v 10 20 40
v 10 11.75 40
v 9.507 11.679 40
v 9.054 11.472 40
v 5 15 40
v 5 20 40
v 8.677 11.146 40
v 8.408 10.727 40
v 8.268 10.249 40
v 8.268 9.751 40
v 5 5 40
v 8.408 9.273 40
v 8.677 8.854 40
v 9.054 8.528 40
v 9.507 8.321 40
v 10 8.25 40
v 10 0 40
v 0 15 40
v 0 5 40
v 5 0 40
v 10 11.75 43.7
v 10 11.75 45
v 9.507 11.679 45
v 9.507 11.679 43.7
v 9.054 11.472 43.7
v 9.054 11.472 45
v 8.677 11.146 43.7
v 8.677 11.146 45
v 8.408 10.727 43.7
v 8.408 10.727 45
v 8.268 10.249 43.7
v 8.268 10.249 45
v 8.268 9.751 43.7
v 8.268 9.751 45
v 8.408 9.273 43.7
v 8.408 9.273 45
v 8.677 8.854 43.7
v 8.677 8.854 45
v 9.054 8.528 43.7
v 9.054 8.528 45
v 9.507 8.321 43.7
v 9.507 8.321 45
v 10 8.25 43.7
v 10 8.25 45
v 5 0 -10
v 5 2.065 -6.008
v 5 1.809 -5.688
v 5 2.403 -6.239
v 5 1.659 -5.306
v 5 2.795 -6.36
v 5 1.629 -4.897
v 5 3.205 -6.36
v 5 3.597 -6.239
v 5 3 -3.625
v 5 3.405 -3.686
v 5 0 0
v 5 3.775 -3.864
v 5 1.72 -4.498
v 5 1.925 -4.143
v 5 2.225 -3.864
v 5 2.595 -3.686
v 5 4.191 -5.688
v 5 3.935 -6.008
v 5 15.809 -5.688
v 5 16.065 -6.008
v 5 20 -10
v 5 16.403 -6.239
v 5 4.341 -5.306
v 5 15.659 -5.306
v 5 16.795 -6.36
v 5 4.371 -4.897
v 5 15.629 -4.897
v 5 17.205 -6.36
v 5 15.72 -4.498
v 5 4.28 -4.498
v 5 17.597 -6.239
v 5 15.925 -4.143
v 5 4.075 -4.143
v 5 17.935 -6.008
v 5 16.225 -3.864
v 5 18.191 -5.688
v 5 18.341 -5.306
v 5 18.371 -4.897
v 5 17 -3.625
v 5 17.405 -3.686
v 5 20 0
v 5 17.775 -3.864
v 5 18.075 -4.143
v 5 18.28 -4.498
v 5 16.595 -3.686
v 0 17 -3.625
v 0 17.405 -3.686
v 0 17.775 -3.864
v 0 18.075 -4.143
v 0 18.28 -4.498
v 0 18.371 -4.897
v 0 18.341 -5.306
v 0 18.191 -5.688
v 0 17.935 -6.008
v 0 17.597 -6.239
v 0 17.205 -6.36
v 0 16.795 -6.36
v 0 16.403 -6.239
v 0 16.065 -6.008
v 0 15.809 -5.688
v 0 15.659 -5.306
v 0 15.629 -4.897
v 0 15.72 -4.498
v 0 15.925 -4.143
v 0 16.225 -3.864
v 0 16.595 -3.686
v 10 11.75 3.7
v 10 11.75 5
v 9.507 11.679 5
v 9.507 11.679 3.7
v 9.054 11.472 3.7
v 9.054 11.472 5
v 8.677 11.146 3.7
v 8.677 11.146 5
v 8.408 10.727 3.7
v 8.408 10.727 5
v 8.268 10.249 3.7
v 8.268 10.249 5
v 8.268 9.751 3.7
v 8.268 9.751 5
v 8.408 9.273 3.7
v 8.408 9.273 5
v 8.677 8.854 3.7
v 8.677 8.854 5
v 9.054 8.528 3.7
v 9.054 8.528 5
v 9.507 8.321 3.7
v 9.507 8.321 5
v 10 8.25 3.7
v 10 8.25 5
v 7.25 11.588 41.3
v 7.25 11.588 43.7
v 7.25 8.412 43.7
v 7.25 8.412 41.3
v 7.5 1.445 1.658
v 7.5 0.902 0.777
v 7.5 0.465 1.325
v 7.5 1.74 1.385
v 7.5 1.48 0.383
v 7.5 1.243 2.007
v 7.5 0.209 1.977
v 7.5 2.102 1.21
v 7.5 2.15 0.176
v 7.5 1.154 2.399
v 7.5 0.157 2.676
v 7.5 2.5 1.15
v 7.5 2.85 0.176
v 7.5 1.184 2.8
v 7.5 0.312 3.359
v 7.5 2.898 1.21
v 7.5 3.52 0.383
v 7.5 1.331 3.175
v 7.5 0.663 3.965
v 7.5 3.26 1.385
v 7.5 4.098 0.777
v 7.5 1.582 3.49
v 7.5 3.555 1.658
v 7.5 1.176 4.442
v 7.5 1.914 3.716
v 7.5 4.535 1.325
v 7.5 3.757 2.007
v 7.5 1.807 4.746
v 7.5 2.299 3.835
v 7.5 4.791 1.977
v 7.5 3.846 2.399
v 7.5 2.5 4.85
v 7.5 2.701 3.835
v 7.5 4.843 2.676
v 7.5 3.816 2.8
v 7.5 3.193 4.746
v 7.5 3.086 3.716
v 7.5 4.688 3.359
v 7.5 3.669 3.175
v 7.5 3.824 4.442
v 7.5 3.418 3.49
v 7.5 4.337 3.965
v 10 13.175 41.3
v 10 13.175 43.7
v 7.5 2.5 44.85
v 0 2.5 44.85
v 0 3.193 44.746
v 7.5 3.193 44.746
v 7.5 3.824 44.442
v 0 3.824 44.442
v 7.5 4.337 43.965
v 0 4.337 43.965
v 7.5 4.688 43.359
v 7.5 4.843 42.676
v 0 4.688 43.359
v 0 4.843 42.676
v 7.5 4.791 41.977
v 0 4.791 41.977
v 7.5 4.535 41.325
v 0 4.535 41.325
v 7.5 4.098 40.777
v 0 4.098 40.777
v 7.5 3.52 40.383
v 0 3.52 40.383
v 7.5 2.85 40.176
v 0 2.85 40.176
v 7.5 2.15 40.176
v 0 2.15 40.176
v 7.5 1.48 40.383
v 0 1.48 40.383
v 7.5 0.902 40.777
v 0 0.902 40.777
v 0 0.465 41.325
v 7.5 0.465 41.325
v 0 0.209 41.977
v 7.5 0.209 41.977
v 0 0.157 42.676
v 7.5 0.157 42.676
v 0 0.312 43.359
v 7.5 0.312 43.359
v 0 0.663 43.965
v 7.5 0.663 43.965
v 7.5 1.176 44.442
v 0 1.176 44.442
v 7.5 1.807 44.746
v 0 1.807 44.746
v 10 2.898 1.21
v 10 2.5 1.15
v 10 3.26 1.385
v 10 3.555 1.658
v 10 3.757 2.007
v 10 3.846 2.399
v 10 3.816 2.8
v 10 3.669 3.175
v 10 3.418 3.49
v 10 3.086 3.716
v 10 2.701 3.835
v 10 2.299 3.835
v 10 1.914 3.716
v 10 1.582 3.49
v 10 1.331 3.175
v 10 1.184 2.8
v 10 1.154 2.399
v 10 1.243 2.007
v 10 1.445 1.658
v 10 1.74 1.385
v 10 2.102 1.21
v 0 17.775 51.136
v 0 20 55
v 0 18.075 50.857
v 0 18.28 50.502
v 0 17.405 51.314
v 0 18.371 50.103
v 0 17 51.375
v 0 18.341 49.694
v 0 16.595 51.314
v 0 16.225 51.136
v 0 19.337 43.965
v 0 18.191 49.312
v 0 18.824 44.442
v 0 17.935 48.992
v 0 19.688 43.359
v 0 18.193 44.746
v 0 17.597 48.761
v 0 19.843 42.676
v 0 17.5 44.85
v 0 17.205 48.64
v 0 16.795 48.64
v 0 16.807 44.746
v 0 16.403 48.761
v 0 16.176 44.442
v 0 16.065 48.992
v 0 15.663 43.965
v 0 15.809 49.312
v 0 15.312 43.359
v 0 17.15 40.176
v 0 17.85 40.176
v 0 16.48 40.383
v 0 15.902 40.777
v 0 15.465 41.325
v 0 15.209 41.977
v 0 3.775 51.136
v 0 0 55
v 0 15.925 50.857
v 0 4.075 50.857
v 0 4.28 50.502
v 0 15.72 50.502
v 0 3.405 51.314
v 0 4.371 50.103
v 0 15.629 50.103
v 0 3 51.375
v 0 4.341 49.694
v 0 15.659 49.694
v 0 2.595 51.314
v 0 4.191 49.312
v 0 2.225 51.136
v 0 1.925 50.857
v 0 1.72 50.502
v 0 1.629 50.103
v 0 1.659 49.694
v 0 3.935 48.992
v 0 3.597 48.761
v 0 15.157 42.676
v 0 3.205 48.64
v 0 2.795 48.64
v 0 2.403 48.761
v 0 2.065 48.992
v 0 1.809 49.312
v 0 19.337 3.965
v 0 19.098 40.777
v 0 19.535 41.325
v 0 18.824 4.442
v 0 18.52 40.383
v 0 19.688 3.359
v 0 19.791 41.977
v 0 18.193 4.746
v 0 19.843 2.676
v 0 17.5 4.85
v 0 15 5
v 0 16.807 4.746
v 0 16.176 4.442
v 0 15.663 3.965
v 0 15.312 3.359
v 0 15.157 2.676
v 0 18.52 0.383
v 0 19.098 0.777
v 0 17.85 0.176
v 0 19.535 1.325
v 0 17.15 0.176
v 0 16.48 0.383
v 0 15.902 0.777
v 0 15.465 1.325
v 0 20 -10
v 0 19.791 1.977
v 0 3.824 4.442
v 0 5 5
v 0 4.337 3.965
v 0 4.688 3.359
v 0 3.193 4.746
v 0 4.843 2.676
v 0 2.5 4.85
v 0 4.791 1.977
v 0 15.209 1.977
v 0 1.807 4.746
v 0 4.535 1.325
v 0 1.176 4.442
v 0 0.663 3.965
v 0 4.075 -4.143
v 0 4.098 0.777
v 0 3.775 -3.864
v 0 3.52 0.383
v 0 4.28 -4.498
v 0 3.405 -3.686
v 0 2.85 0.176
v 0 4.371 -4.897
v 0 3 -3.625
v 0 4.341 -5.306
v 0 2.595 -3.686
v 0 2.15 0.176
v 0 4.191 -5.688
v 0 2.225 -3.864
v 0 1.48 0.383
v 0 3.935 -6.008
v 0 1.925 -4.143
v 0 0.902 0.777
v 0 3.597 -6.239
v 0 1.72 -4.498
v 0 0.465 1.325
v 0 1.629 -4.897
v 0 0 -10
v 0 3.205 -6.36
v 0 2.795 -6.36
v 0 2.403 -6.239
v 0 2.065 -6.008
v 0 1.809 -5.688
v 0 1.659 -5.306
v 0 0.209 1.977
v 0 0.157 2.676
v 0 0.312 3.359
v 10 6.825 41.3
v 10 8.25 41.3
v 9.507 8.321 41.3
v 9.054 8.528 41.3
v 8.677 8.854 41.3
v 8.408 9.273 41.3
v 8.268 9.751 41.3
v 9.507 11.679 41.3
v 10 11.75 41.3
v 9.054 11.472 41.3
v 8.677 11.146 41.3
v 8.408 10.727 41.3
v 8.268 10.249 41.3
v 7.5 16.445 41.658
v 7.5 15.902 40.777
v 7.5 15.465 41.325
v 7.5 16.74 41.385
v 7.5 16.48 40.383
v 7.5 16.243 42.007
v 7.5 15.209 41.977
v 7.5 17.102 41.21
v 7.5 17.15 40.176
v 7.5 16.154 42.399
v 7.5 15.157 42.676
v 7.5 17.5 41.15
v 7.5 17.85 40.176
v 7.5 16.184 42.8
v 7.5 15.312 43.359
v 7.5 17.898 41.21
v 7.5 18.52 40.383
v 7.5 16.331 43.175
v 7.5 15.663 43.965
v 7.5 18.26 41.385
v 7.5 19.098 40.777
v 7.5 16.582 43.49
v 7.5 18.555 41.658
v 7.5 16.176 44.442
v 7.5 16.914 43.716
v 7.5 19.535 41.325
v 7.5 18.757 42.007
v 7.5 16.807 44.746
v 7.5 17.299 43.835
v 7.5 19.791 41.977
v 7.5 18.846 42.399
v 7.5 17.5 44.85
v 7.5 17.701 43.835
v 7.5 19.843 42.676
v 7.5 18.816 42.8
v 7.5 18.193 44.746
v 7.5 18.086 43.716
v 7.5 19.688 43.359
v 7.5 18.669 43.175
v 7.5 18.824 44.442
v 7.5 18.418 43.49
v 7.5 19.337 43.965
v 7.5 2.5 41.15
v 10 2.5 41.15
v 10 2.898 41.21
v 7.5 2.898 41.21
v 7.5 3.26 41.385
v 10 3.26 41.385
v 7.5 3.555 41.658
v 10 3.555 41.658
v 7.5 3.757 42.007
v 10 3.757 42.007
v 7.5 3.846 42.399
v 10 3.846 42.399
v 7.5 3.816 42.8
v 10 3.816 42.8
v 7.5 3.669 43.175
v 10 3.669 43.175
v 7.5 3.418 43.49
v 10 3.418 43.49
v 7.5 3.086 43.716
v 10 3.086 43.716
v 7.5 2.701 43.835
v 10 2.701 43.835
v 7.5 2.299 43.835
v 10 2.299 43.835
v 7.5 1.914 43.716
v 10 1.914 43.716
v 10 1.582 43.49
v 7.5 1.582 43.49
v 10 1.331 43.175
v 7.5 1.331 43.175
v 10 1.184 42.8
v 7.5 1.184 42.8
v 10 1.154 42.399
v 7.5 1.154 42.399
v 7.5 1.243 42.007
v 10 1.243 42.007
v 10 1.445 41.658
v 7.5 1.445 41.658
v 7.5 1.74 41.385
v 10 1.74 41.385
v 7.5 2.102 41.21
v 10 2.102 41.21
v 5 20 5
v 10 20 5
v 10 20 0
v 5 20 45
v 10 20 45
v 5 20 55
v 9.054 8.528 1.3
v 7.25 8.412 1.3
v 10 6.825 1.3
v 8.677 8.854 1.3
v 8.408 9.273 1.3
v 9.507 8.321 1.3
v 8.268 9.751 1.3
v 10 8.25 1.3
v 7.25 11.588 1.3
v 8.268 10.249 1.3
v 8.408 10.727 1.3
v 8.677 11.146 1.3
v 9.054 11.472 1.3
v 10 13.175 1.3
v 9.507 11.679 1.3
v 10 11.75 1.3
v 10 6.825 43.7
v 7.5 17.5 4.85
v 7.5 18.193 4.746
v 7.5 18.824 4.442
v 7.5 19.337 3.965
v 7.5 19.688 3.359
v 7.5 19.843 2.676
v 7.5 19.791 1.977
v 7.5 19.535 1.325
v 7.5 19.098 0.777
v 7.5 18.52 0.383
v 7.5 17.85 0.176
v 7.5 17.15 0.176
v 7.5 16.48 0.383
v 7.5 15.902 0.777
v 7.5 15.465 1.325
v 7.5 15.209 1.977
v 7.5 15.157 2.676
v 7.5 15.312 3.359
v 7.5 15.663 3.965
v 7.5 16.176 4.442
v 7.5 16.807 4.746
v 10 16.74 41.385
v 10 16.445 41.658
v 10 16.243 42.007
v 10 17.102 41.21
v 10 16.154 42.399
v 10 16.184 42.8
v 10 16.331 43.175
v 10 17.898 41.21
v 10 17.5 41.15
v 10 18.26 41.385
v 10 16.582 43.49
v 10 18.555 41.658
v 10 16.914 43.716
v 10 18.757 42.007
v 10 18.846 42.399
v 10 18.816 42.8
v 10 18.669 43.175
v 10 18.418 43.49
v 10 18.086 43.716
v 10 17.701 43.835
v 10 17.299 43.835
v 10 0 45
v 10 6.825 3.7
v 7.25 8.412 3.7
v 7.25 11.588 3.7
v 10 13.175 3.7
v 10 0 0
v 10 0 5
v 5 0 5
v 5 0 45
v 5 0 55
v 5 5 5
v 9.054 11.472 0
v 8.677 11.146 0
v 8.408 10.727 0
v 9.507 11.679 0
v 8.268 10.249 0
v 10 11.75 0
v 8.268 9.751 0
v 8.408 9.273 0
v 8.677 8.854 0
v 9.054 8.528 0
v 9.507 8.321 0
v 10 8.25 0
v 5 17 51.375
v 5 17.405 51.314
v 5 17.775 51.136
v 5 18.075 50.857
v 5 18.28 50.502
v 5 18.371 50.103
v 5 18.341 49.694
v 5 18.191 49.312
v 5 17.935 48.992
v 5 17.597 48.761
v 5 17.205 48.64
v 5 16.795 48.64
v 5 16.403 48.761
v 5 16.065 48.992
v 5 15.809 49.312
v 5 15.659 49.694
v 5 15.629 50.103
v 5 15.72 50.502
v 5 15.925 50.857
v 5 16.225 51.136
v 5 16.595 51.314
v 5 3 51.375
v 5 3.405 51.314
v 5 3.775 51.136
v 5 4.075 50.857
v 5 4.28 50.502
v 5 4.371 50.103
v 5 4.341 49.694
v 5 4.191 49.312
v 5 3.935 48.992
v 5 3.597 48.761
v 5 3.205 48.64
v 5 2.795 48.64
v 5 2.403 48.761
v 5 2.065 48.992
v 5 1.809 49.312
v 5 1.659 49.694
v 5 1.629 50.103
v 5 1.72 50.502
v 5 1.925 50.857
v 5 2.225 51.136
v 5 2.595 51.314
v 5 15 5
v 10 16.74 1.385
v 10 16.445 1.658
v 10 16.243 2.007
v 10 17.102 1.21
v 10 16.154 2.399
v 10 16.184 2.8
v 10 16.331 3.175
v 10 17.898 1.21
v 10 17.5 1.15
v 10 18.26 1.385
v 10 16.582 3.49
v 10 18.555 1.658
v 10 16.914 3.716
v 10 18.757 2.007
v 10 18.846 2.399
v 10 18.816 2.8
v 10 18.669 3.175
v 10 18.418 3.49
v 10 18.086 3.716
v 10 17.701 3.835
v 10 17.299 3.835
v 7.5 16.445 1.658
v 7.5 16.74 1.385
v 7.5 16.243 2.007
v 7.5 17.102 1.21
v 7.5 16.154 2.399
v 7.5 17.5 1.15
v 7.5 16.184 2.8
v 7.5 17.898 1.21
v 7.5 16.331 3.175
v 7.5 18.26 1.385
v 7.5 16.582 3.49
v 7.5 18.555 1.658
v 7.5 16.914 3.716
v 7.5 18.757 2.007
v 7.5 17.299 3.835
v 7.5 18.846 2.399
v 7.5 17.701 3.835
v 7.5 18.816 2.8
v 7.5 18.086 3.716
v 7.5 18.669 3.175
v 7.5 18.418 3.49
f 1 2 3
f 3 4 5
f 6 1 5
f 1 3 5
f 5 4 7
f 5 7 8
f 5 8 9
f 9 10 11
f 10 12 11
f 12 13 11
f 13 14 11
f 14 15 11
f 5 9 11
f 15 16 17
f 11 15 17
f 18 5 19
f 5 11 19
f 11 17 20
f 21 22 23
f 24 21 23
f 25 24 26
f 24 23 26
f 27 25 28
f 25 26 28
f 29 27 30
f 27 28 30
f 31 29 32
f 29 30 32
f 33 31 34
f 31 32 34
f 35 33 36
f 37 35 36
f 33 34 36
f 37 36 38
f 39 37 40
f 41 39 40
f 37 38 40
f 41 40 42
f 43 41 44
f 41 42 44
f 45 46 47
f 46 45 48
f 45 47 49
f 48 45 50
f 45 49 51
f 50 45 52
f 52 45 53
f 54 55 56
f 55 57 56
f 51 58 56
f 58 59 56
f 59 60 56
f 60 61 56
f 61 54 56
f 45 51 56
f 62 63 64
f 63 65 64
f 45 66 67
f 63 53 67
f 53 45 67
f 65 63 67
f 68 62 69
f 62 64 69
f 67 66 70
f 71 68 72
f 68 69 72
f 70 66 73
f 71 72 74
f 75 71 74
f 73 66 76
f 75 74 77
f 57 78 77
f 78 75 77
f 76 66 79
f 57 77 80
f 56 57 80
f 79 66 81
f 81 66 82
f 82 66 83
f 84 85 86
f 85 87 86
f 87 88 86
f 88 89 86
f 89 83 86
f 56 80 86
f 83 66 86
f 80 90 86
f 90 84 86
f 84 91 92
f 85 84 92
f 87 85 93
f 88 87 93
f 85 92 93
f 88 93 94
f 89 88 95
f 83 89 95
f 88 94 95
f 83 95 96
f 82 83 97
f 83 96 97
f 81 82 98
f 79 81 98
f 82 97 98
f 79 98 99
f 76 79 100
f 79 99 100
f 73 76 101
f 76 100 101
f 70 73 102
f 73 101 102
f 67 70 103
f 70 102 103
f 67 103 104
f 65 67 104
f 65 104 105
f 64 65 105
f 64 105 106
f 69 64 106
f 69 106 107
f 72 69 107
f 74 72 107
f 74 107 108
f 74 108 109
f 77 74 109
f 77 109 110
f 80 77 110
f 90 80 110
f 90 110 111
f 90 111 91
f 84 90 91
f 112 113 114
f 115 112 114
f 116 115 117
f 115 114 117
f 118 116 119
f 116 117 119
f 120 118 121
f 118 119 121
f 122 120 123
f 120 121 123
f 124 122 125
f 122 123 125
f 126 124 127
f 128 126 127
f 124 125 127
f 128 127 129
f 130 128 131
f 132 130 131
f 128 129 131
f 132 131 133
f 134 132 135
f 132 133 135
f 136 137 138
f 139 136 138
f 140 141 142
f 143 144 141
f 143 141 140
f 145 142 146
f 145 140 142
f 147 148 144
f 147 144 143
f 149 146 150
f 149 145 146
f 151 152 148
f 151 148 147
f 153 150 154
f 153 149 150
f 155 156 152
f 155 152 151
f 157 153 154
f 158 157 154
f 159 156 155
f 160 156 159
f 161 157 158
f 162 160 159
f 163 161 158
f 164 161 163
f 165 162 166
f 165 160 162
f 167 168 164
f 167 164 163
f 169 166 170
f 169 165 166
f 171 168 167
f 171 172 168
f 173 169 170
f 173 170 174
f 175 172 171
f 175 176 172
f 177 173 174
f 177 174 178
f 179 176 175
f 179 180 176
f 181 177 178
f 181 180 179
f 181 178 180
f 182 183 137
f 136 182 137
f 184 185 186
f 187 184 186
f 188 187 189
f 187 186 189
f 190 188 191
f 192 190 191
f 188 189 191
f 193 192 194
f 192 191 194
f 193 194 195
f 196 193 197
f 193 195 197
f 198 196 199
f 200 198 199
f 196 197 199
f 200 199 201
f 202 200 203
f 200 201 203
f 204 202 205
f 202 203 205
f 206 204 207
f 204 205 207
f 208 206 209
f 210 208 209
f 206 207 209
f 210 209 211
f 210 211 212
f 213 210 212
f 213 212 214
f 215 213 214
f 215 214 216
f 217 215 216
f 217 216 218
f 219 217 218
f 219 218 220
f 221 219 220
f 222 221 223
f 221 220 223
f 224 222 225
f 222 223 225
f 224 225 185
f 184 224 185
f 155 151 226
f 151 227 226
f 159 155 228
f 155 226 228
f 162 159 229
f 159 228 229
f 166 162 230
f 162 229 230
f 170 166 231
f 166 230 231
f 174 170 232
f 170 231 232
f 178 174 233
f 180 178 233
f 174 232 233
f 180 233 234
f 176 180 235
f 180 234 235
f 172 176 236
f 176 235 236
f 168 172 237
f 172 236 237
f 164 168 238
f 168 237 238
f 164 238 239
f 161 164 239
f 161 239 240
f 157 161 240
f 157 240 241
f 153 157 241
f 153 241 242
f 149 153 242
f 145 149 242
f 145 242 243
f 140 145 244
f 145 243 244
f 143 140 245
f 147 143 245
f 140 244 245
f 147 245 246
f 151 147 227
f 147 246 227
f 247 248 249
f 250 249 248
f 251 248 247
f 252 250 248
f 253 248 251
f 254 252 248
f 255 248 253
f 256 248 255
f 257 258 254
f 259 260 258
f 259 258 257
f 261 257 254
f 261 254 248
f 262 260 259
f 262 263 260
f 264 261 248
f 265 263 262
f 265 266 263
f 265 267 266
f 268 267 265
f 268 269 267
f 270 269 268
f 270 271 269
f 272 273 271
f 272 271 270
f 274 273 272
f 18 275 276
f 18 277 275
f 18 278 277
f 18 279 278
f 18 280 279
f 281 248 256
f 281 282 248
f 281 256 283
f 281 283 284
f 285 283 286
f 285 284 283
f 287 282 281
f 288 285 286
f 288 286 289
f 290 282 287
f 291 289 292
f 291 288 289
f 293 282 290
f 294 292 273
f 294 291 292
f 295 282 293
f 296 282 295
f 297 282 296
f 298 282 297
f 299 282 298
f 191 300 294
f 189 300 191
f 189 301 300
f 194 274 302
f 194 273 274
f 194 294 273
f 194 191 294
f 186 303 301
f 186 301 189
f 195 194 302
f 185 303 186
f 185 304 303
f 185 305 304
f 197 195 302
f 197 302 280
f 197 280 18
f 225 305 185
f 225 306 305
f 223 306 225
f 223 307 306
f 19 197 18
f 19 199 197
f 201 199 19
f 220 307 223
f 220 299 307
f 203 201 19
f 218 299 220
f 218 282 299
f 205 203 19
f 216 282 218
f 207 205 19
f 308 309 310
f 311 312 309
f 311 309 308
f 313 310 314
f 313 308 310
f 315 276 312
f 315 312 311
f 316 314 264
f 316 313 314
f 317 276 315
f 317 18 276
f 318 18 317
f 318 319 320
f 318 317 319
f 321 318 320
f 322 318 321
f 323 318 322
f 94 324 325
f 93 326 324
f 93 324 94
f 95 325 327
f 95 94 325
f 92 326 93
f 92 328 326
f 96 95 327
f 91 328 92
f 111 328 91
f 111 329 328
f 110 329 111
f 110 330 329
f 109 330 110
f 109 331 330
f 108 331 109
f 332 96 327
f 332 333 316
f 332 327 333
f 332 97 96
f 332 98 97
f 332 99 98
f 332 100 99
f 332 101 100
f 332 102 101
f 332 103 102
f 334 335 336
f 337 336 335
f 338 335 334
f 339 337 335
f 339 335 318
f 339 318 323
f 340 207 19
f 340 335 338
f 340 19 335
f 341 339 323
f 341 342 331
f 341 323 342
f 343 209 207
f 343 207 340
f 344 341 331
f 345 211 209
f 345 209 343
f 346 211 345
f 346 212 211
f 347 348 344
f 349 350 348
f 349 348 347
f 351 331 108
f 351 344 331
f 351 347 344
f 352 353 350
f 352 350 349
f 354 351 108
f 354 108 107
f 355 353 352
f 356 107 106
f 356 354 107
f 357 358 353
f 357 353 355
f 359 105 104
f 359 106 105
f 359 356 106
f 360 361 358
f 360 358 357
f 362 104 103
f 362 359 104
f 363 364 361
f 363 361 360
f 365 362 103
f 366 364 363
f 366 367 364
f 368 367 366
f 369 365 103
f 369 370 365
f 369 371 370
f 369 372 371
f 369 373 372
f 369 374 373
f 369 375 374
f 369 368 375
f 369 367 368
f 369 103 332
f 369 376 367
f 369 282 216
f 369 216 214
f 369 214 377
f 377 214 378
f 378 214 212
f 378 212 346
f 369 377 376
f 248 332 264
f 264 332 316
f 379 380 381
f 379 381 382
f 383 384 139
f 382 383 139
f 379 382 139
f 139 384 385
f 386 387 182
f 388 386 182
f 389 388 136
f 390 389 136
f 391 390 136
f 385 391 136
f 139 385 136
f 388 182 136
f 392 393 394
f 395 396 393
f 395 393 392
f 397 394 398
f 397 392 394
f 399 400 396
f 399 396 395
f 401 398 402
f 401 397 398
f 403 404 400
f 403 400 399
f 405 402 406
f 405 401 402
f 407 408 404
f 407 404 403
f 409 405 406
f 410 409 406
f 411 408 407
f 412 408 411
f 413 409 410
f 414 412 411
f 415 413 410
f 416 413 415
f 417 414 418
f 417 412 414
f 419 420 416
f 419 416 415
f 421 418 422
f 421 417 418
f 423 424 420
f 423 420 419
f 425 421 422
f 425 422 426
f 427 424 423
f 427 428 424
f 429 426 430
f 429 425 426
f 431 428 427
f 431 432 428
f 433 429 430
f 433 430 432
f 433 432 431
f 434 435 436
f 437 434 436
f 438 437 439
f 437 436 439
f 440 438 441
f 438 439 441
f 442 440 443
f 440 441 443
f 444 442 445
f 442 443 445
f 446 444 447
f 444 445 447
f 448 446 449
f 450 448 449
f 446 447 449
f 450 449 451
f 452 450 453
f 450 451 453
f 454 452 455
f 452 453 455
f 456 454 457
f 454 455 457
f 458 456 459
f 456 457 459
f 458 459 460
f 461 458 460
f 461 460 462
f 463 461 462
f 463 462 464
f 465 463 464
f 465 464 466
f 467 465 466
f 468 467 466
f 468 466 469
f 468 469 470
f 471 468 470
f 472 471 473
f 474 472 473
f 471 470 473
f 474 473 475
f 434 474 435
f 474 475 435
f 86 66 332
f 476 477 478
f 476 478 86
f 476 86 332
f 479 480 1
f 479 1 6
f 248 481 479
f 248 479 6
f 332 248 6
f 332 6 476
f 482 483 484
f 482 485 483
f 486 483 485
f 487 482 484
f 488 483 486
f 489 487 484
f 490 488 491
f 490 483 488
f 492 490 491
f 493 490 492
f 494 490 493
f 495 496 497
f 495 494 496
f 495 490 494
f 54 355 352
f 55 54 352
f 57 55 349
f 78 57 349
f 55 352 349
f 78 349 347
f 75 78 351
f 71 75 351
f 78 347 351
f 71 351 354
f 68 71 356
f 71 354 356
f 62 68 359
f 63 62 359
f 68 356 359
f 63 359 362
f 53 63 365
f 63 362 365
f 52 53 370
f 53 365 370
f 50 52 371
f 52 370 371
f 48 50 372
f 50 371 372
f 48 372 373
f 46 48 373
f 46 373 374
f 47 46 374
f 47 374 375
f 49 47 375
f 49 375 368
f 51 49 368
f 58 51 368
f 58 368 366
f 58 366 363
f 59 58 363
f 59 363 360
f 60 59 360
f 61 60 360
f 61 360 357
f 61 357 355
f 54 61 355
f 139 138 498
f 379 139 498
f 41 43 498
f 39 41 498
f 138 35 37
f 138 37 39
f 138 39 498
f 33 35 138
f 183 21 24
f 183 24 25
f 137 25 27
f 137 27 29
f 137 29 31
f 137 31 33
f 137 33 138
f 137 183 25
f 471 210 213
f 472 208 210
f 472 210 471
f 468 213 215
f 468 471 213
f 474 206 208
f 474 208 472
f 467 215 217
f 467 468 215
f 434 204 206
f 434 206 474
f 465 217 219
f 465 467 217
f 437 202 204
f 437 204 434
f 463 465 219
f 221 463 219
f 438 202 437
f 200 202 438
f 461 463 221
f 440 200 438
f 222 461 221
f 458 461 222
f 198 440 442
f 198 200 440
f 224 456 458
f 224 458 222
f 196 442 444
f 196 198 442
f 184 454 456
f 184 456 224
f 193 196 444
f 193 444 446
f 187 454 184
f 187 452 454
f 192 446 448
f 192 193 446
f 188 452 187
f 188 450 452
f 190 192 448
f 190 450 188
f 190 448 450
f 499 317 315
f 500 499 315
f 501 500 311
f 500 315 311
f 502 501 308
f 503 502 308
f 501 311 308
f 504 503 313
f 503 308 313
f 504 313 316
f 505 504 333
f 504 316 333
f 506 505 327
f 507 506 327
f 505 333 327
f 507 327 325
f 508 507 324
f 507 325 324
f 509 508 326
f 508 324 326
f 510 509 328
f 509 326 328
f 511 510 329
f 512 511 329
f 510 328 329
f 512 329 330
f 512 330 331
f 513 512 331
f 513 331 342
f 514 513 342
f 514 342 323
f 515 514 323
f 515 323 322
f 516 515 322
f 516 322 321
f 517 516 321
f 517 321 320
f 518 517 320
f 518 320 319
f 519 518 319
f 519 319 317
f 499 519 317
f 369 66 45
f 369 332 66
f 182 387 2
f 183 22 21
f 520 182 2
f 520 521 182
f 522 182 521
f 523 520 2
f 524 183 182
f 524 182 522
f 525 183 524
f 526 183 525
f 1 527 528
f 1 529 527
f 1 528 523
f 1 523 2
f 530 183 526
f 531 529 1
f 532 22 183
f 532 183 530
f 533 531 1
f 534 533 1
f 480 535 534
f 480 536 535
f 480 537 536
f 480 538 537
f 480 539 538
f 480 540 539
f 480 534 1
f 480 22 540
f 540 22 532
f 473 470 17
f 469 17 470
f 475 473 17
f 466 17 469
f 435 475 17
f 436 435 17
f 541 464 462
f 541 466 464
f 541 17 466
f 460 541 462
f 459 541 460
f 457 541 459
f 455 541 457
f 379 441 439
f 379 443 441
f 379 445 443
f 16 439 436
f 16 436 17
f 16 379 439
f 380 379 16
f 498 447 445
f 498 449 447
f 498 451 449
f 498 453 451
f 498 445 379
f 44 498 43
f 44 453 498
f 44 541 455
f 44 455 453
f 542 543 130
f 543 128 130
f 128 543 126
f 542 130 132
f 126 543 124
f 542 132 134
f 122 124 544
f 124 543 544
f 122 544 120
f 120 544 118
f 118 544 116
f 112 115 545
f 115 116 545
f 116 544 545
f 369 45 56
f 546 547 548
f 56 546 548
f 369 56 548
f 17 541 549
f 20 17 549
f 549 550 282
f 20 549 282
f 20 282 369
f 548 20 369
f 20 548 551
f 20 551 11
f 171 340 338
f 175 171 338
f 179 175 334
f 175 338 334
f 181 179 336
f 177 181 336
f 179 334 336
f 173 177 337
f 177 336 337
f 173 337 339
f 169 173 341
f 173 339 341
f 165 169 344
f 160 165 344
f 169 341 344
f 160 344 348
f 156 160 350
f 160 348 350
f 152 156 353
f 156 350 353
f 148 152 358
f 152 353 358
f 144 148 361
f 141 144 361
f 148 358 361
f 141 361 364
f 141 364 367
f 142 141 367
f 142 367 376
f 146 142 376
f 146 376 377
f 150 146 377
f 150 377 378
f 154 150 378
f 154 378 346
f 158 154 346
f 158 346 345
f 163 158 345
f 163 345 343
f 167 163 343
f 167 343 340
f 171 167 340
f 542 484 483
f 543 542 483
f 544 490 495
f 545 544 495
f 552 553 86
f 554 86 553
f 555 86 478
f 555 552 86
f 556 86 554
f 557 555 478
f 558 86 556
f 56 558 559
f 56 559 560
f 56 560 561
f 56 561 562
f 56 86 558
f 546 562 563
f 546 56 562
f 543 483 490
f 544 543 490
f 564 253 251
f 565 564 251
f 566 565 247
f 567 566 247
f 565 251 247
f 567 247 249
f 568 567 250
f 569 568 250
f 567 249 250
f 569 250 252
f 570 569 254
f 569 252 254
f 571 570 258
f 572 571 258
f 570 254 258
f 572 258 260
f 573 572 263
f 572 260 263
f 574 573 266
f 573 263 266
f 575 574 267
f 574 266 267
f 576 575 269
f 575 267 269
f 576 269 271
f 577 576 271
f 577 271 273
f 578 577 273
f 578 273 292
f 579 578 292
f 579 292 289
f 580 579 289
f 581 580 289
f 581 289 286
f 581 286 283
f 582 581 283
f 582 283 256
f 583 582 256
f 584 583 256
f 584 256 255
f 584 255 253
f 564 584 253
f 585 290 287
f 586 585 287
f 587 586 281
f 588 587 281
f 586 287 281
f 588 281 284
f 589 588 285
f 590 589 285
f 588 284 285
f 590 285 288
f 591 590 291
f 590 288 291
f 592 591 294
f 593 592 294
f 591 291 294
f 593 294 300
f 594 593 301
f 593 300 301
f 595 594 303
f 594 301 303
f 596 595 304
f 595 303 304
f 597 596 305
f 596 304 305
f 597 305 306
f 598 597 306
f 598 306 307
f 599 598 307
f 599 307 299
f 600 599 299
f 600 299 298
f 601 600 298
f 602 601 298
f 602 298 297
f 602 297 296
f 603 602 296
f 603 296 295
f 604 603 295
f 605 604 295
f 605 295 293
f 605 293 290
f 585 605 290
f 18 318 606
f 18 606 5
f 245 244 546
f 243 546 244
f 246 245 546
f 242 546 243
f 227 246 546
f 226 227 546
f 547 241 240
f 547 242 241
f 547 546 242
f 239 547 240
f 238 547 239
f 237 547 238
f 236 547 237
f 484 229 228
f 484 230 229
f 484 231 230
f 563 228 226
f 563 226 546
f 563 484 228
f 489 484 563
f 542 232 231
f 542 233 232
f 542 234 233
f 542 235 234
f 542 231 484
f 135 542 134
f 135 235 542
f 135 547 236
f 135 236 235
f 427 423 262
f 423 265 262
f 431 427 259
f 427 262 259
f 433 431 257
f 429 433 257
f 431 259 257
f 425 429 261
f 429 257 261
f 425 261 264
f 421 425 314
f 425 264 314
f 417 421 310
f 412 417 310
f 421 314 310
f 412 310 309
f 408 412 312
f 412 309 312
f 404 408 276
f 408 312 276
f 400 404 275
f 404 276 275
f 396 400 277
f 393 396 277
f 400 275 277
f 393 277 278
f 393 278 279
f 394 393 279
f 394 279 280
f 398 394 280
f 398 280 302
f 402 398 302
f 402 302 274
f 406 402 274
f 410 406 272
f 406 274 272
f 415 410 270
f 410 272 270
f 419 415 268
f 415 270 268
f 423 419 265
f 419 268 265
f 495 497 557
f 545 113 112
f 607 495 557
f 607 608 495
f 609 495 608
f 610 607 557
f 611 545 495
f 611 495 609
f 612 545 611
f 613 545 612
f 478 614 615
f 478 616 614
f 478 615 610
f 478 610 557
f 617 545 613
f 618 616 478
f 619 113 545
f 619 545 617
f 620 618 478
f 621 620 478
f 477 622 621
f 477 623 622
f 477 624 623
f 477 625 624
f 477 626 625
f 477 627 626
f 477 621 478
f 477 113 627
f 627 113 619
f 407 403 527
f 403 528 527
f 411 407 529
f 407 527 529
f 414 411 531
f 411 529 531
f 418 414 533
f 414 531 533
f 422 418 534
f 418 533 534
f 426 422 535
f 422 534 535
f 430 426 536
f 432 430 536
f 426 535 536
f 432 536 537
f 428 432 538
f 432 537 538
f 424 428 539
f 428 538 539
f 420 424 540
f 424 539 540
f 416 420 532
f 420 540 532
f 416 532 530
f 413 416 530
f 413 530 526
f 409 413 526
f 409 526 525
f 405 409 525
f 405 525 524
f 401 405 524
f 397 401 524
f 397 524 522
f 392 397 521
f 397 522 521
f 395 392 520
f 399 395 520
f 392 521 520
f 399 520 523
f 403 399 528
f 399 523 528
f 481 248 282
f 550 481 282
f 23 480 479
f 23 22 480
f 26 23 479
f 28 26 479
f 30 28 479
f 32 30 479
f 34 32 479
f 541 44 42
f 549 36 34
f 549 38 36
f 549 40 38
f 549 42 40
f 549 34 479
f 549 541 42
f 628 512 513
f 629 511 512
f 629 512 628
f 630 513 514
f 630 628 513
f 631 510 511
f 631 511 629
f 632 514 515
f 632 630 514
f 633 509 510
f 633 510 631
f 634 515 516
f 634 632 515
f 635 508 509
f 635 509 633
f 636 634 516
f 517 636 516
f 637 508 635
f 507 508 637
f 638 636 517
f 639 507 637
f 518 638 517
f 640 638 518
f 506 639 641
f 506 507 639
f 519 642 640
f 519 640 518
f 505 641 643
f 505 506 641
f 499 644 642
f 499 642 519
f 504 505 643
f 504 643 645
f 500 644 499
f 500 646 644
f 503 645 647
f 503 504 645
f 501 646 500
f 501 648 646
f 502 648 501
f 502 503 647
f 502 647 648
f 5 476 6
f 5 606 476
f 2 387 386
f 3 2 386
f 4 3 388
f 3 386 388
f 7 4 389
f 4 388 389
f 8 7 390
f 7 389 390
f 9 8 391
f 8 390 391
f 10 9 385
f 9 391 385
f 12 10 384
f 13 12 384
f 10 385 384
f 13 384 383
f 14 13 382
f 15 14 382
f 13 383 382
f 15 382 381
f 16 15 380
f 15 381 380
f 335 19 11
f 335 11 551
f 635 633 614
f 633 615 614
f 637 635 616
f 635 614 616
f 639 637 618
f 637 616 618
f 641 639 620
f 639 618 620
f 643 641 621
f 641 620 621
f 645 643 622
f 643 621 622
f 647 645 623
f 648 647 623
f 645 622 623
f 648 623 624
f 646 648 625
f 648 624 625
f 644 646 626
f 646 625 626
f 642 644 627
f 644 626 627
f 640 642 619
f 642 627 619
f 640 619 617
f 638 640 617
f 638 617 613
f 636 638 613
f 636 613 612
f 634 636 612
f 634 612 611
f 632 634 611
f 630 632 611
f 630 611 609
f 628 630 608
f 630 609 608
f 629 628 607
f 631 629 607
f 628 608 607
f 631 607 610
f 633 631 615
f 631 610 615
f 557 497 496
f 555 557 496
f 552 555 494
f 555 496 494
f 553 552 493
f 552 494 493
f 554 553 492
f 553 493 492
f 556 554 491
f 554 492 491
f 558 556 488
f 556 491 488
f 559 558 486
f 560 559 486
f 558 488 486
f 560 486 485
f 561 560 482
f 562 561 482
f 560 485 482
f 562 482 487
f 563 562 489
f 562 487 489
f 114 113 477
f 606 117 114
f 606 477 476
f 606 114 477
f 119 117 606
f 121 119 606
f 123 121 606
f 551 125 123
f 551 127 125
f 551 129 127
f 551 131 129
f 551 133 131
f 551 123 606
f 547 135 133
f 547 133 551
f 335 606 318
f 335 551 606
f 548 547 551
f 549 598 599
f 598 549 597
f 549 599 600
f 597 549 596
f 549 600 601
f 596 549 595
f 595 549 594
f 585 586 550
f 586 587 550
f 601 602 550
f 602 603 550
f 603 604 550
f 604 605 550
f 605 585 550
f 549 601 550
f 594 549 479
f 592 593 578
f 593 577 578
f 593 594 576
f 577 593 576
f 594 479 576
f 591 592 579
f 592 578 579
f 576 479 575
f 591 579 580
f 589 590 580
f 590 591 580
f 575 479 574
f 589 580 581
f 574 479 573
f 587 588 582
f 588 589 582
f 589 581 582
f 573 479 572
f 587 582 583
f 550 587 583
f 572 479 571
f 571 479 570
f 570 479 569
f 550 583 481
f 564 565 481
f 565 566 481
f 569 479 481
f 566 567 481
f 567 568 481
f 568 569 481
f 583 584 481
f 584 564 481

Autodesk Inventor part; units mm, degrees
ref_plane "YZ Plane" through (0, 0, 0) normal (1, 0, 0) x (0, 1, 0)
sketch "Sketch1" plane through (0, 0, 0) normal (0, 1, 0) x (-1, 0, 0)
  line L0 (0, 0) -> (-5, 0)
  line L1 (-5, 0) -> (-5, 45)
  line L2 (-5, 45) -> (0, 45)
  line L3 (0, 45) -> (0, 0)
  line L4 (-5, 45) -> (-20, 45)
  line L5 (-20, 45) -> (-20, 40)
  line L6 (-20, 40) -> (-5, 40)
  line L7 (-5, 40) -> (-5, 45)
  line L8 (-5, 0) -> (-20, 0)
  line L9 (-20, 0) -> (-20, 5)
  line L10 (-20, 5) -> (-5, 5)
  line L11 (-5, 5) -> (-5, 0)
  point P0 (-5, 40)
  point P1 (-5, 5)
  dimension "d0" = 5
  dimension "d1" = 5
  dimension "d2" = 5
  dimension "d3" = 15
  dimension "d4" = 15
  dimension "d5" = 35
extrude "Extrusion1" add sketch "Sketch1" along normal blind 20
sketch "Sketch2" plane through (0, 0, 45) normal (0, 0, 1) x (1, 0, 0)
  circle A0 centre (10, 10) radius 1.75
  line L0 (20, 0) -> (20, 20) projected
  line L1 (20, 0) -> (10, 0)
  line L2 (10, 0) -> (10, 20)
  line L3 (10, 20) -> (20, 20)
  line L4 (20, 20) -> (20, 0)
  line L5 (0, 0) -> (20, 0) projected
  dimension "d8" = 10
  dimension "d9" = 10
  dimension "d10" = 10
  dimension "d11" = 3.5
extrude "Extrusion2" cut sketch "Sketch2" against normal blind 200
sketch "Sketch3" plane through (0, 0, 0) normal (-1, 0, 0) x (0, 0, 1)
  line L0 (5, 0) -> (5, 20) projected
  line L1 (40, 0) -> (40, 20) projected
  line L2 (5, 15) -> (40, 15)
  line L3 (40, 15) -> (40, 5)
  line L4 (40, 5) -> (5, 5)
  line L5 (5, 5) -> (5, 15)
  line L6 (0, 20) -> (45, 20) projected
  line L7 (0, 0) -> (45, 0) projected
  point P0 (5, 5)
  dimension "d14" = 5
  dimension "d15" = 5
extrude "Extrusion3" cut sketch "Sketch3" against normal blind 20 contours L0 L2 L1 L4
sketch "Sketch4" plane through (0, 0, 0) normal (-1, 0, 0) x (0, 0, 1)
  line L0 (45, 0) -> (45, 20) projected
  line L1 (45, 20) -> (55, 20)
  line L2 (55, 20) -> (55, 0)
  line L3 (55, 0) -> (45, 0)
  line L4 (45, 0) -> (45, 20)
  line L5 (0, 20) -> (0, 11.75) projected
  line L6 (0, 20) -> (-10, 20)
  line L7 (-10, 20) -> (-10, 0)
  line L8 (-10, 0) -> (0, 0)
  line L9 (0, 0) -> (0, 20)
  circle A0 centre (50, 3) radius 1.375
  circle A1 centre (50, 17) radius 1.375
  circle A2 centre (-5, 17) radius 1.375
  circle A3 centre (-5, 3) radius 1.375
  point P0 (0, 0)
  point P1 (50, 20)
  dimension "d18" = 10
  dimension "d19" = 10
  dimension "d20" = 3
  dimension "d21" = 3
  dimension "d22" = 5
  dimension "d23" = 5
  dimension "d24" = 5
  dimension "d25" = 5
  dimension "d26" = 3
  dimension "d27" = 3
  dimension "d28" = 2.75
  dimension "d29" = 2.75
  dimension "d30" = 2.75
  dimension "d31" = 2.75
extrude "Extrusion4" add sketch "Sketch4" against normal blind 5
sketch "Sketch5" plane through (10, 11.75, 45) normal (1, 0, 0) x (0, 0, -1)
  circle A0 centre (42.5, 5.75) radius 1.35
  circle A1 centre (42.5, -9.25) radius 1.35
  circle A2 centre (2.5, 5.75) radius 1.35
  circle A3 centre (2.5, -9.25) radius 1.35
  line L0 (40, 8.25) -> (45, 8.25) projected
  line L1 (45, 8.25) -> (45, 0) projected
  line L2 (45, -3.5) -> (45, -11.75) projected
  line L3 (45, -11.75) -> (40, -11.75) projected
  line L4 (5, -11.75) -> (0, -11.75) projected
  line L5 (0, -11.75) -> (0, -3.5) projected
  line L6 (0, 0) -> (0, 8.25) projected
  line L7 (0, 8.25) -> (5, 8.25) projected
  dimension "d34" = 2.5
  dimension "d35" = 2.5
  dimension "d36" = 2.5
  dimension "d37" = 2.5
  dimension "d38" = 2.5
  dimension "d39" = 2.5
  dimension "d40" = 2.5
  dimension "d41" = 2.5
  dimension "d42" = 2.7
  dimension "d43" = 2.7
  dimension "d44" = 2.7
  dimension "d45" = 2.7
extrude "Extrusion5" cut sketch "Sketch5" against normal blind 15
sketch "Sketch6" plane through (0, 0, 55) normal (-1, 0, 0) x (0, 0, 1)
  circle A0 centre (-12.5, 17.5) radius 1.35 projected
  circle A1 centre (-12.5, 17.5) radius 2.35
  circle A2 centre (-12.5, 2.5) radius 1.35 projected
  circle A3 centre (-12.5, 2.5) radius 2.35
  circle A4 centre (-52.5, 2.5) radius 1.35 projected
  circle A5 centre (-52.5, 2.5) radius 2.35
  circle A6 centre (-52.5, 17.5) radius 1.35 projected
  circle A7 centre (-52.5, 17.5) radius 2.35
  point P0 (-55, 0)
  dimension "d48" = 4.7
  dimension "d49" = 4.7
  dimension "d50" = 4.7
  dimension "d51" = 4.7
extrude "Extrusion6" cut sketch "Sketch6" against normal blind 7.5 contours A0 | A1 | A2 | A3 | A4 | A5 | A6 | A7
ref_plane "Work Plane1" through (10, 0, 42.5) normal (0, 0, -1) x (-1, 0, 0)
sketch "Sketch7" plane through (10, 0, 42.5) normal (0, 0, -1) x (-1, 0, 0)
  line L0 (0, 11.75) -> (0, 20) projected
  line L1 (5, 20) -> (0, 20) projected
  line L2 (5, 0) -> (0, 0) projected
  arc A0 (0, 8.25) -> (0, 11.75) centre (0, 10) ccw projected
  line L3 (0, 20) -> (0, 11.75) projected
  line L4 (0, 13.1754) -> (2.75, 11.5877)
  line L5 (2.75, 11.5877) -> (2.75, 8.4123)
  line L6 (2.75, 8.4123) -> (0, 6.8246)
  line L7 (0, 6.8246) -> (-2.75, 8.4123)
  line L8 (-2.75, 8.4123) -> (-2.75, 11.5877)
  line L9 (-2.75, 11.5877) -> (0, 13.1754)
  point P0 (10, 0)
  dimension "d57" = 20
  dimension "d60" = 2.75
extrude "Extrusion7" cut sketch "Sketch7" along normal mid plane 2.4
ref_plane "Work Plane2" through (0, 0, 22.5) normal (0, 0, 1) x (1, 0, 0)
mirror "Mirror1" about plane through (0, 0, 22.5) normal (0, 0, 1) of "Extrusion7"
equation "\"d14\" = d15"
equation "\"d19\" = d18"
equation "\"d20\" = d21"
equation "\"d24\" = d23"
equation "\"d25\" = d22"
equation "\"d26\" = d20"
equation "\"d27\" = d21"
equation "\"d34\" = d35"
equation "\"d37\" = d34"
equation "\"d38\" = d34"
equation "\"d39\" = d36"
equation "\"d40\" = d39"
equation "\"d41\" = d34"
equation "\"d43\" = d42"
equation "\"d44\" = d42"
equation "\"d45\" = d43"
equation "\"d49\" = d48"
equation "\"d50\" = d49"
equation "\"d51\" = d48"
properties part number "MotorDifferentialMountingBracket" material "Stainless Steel"
